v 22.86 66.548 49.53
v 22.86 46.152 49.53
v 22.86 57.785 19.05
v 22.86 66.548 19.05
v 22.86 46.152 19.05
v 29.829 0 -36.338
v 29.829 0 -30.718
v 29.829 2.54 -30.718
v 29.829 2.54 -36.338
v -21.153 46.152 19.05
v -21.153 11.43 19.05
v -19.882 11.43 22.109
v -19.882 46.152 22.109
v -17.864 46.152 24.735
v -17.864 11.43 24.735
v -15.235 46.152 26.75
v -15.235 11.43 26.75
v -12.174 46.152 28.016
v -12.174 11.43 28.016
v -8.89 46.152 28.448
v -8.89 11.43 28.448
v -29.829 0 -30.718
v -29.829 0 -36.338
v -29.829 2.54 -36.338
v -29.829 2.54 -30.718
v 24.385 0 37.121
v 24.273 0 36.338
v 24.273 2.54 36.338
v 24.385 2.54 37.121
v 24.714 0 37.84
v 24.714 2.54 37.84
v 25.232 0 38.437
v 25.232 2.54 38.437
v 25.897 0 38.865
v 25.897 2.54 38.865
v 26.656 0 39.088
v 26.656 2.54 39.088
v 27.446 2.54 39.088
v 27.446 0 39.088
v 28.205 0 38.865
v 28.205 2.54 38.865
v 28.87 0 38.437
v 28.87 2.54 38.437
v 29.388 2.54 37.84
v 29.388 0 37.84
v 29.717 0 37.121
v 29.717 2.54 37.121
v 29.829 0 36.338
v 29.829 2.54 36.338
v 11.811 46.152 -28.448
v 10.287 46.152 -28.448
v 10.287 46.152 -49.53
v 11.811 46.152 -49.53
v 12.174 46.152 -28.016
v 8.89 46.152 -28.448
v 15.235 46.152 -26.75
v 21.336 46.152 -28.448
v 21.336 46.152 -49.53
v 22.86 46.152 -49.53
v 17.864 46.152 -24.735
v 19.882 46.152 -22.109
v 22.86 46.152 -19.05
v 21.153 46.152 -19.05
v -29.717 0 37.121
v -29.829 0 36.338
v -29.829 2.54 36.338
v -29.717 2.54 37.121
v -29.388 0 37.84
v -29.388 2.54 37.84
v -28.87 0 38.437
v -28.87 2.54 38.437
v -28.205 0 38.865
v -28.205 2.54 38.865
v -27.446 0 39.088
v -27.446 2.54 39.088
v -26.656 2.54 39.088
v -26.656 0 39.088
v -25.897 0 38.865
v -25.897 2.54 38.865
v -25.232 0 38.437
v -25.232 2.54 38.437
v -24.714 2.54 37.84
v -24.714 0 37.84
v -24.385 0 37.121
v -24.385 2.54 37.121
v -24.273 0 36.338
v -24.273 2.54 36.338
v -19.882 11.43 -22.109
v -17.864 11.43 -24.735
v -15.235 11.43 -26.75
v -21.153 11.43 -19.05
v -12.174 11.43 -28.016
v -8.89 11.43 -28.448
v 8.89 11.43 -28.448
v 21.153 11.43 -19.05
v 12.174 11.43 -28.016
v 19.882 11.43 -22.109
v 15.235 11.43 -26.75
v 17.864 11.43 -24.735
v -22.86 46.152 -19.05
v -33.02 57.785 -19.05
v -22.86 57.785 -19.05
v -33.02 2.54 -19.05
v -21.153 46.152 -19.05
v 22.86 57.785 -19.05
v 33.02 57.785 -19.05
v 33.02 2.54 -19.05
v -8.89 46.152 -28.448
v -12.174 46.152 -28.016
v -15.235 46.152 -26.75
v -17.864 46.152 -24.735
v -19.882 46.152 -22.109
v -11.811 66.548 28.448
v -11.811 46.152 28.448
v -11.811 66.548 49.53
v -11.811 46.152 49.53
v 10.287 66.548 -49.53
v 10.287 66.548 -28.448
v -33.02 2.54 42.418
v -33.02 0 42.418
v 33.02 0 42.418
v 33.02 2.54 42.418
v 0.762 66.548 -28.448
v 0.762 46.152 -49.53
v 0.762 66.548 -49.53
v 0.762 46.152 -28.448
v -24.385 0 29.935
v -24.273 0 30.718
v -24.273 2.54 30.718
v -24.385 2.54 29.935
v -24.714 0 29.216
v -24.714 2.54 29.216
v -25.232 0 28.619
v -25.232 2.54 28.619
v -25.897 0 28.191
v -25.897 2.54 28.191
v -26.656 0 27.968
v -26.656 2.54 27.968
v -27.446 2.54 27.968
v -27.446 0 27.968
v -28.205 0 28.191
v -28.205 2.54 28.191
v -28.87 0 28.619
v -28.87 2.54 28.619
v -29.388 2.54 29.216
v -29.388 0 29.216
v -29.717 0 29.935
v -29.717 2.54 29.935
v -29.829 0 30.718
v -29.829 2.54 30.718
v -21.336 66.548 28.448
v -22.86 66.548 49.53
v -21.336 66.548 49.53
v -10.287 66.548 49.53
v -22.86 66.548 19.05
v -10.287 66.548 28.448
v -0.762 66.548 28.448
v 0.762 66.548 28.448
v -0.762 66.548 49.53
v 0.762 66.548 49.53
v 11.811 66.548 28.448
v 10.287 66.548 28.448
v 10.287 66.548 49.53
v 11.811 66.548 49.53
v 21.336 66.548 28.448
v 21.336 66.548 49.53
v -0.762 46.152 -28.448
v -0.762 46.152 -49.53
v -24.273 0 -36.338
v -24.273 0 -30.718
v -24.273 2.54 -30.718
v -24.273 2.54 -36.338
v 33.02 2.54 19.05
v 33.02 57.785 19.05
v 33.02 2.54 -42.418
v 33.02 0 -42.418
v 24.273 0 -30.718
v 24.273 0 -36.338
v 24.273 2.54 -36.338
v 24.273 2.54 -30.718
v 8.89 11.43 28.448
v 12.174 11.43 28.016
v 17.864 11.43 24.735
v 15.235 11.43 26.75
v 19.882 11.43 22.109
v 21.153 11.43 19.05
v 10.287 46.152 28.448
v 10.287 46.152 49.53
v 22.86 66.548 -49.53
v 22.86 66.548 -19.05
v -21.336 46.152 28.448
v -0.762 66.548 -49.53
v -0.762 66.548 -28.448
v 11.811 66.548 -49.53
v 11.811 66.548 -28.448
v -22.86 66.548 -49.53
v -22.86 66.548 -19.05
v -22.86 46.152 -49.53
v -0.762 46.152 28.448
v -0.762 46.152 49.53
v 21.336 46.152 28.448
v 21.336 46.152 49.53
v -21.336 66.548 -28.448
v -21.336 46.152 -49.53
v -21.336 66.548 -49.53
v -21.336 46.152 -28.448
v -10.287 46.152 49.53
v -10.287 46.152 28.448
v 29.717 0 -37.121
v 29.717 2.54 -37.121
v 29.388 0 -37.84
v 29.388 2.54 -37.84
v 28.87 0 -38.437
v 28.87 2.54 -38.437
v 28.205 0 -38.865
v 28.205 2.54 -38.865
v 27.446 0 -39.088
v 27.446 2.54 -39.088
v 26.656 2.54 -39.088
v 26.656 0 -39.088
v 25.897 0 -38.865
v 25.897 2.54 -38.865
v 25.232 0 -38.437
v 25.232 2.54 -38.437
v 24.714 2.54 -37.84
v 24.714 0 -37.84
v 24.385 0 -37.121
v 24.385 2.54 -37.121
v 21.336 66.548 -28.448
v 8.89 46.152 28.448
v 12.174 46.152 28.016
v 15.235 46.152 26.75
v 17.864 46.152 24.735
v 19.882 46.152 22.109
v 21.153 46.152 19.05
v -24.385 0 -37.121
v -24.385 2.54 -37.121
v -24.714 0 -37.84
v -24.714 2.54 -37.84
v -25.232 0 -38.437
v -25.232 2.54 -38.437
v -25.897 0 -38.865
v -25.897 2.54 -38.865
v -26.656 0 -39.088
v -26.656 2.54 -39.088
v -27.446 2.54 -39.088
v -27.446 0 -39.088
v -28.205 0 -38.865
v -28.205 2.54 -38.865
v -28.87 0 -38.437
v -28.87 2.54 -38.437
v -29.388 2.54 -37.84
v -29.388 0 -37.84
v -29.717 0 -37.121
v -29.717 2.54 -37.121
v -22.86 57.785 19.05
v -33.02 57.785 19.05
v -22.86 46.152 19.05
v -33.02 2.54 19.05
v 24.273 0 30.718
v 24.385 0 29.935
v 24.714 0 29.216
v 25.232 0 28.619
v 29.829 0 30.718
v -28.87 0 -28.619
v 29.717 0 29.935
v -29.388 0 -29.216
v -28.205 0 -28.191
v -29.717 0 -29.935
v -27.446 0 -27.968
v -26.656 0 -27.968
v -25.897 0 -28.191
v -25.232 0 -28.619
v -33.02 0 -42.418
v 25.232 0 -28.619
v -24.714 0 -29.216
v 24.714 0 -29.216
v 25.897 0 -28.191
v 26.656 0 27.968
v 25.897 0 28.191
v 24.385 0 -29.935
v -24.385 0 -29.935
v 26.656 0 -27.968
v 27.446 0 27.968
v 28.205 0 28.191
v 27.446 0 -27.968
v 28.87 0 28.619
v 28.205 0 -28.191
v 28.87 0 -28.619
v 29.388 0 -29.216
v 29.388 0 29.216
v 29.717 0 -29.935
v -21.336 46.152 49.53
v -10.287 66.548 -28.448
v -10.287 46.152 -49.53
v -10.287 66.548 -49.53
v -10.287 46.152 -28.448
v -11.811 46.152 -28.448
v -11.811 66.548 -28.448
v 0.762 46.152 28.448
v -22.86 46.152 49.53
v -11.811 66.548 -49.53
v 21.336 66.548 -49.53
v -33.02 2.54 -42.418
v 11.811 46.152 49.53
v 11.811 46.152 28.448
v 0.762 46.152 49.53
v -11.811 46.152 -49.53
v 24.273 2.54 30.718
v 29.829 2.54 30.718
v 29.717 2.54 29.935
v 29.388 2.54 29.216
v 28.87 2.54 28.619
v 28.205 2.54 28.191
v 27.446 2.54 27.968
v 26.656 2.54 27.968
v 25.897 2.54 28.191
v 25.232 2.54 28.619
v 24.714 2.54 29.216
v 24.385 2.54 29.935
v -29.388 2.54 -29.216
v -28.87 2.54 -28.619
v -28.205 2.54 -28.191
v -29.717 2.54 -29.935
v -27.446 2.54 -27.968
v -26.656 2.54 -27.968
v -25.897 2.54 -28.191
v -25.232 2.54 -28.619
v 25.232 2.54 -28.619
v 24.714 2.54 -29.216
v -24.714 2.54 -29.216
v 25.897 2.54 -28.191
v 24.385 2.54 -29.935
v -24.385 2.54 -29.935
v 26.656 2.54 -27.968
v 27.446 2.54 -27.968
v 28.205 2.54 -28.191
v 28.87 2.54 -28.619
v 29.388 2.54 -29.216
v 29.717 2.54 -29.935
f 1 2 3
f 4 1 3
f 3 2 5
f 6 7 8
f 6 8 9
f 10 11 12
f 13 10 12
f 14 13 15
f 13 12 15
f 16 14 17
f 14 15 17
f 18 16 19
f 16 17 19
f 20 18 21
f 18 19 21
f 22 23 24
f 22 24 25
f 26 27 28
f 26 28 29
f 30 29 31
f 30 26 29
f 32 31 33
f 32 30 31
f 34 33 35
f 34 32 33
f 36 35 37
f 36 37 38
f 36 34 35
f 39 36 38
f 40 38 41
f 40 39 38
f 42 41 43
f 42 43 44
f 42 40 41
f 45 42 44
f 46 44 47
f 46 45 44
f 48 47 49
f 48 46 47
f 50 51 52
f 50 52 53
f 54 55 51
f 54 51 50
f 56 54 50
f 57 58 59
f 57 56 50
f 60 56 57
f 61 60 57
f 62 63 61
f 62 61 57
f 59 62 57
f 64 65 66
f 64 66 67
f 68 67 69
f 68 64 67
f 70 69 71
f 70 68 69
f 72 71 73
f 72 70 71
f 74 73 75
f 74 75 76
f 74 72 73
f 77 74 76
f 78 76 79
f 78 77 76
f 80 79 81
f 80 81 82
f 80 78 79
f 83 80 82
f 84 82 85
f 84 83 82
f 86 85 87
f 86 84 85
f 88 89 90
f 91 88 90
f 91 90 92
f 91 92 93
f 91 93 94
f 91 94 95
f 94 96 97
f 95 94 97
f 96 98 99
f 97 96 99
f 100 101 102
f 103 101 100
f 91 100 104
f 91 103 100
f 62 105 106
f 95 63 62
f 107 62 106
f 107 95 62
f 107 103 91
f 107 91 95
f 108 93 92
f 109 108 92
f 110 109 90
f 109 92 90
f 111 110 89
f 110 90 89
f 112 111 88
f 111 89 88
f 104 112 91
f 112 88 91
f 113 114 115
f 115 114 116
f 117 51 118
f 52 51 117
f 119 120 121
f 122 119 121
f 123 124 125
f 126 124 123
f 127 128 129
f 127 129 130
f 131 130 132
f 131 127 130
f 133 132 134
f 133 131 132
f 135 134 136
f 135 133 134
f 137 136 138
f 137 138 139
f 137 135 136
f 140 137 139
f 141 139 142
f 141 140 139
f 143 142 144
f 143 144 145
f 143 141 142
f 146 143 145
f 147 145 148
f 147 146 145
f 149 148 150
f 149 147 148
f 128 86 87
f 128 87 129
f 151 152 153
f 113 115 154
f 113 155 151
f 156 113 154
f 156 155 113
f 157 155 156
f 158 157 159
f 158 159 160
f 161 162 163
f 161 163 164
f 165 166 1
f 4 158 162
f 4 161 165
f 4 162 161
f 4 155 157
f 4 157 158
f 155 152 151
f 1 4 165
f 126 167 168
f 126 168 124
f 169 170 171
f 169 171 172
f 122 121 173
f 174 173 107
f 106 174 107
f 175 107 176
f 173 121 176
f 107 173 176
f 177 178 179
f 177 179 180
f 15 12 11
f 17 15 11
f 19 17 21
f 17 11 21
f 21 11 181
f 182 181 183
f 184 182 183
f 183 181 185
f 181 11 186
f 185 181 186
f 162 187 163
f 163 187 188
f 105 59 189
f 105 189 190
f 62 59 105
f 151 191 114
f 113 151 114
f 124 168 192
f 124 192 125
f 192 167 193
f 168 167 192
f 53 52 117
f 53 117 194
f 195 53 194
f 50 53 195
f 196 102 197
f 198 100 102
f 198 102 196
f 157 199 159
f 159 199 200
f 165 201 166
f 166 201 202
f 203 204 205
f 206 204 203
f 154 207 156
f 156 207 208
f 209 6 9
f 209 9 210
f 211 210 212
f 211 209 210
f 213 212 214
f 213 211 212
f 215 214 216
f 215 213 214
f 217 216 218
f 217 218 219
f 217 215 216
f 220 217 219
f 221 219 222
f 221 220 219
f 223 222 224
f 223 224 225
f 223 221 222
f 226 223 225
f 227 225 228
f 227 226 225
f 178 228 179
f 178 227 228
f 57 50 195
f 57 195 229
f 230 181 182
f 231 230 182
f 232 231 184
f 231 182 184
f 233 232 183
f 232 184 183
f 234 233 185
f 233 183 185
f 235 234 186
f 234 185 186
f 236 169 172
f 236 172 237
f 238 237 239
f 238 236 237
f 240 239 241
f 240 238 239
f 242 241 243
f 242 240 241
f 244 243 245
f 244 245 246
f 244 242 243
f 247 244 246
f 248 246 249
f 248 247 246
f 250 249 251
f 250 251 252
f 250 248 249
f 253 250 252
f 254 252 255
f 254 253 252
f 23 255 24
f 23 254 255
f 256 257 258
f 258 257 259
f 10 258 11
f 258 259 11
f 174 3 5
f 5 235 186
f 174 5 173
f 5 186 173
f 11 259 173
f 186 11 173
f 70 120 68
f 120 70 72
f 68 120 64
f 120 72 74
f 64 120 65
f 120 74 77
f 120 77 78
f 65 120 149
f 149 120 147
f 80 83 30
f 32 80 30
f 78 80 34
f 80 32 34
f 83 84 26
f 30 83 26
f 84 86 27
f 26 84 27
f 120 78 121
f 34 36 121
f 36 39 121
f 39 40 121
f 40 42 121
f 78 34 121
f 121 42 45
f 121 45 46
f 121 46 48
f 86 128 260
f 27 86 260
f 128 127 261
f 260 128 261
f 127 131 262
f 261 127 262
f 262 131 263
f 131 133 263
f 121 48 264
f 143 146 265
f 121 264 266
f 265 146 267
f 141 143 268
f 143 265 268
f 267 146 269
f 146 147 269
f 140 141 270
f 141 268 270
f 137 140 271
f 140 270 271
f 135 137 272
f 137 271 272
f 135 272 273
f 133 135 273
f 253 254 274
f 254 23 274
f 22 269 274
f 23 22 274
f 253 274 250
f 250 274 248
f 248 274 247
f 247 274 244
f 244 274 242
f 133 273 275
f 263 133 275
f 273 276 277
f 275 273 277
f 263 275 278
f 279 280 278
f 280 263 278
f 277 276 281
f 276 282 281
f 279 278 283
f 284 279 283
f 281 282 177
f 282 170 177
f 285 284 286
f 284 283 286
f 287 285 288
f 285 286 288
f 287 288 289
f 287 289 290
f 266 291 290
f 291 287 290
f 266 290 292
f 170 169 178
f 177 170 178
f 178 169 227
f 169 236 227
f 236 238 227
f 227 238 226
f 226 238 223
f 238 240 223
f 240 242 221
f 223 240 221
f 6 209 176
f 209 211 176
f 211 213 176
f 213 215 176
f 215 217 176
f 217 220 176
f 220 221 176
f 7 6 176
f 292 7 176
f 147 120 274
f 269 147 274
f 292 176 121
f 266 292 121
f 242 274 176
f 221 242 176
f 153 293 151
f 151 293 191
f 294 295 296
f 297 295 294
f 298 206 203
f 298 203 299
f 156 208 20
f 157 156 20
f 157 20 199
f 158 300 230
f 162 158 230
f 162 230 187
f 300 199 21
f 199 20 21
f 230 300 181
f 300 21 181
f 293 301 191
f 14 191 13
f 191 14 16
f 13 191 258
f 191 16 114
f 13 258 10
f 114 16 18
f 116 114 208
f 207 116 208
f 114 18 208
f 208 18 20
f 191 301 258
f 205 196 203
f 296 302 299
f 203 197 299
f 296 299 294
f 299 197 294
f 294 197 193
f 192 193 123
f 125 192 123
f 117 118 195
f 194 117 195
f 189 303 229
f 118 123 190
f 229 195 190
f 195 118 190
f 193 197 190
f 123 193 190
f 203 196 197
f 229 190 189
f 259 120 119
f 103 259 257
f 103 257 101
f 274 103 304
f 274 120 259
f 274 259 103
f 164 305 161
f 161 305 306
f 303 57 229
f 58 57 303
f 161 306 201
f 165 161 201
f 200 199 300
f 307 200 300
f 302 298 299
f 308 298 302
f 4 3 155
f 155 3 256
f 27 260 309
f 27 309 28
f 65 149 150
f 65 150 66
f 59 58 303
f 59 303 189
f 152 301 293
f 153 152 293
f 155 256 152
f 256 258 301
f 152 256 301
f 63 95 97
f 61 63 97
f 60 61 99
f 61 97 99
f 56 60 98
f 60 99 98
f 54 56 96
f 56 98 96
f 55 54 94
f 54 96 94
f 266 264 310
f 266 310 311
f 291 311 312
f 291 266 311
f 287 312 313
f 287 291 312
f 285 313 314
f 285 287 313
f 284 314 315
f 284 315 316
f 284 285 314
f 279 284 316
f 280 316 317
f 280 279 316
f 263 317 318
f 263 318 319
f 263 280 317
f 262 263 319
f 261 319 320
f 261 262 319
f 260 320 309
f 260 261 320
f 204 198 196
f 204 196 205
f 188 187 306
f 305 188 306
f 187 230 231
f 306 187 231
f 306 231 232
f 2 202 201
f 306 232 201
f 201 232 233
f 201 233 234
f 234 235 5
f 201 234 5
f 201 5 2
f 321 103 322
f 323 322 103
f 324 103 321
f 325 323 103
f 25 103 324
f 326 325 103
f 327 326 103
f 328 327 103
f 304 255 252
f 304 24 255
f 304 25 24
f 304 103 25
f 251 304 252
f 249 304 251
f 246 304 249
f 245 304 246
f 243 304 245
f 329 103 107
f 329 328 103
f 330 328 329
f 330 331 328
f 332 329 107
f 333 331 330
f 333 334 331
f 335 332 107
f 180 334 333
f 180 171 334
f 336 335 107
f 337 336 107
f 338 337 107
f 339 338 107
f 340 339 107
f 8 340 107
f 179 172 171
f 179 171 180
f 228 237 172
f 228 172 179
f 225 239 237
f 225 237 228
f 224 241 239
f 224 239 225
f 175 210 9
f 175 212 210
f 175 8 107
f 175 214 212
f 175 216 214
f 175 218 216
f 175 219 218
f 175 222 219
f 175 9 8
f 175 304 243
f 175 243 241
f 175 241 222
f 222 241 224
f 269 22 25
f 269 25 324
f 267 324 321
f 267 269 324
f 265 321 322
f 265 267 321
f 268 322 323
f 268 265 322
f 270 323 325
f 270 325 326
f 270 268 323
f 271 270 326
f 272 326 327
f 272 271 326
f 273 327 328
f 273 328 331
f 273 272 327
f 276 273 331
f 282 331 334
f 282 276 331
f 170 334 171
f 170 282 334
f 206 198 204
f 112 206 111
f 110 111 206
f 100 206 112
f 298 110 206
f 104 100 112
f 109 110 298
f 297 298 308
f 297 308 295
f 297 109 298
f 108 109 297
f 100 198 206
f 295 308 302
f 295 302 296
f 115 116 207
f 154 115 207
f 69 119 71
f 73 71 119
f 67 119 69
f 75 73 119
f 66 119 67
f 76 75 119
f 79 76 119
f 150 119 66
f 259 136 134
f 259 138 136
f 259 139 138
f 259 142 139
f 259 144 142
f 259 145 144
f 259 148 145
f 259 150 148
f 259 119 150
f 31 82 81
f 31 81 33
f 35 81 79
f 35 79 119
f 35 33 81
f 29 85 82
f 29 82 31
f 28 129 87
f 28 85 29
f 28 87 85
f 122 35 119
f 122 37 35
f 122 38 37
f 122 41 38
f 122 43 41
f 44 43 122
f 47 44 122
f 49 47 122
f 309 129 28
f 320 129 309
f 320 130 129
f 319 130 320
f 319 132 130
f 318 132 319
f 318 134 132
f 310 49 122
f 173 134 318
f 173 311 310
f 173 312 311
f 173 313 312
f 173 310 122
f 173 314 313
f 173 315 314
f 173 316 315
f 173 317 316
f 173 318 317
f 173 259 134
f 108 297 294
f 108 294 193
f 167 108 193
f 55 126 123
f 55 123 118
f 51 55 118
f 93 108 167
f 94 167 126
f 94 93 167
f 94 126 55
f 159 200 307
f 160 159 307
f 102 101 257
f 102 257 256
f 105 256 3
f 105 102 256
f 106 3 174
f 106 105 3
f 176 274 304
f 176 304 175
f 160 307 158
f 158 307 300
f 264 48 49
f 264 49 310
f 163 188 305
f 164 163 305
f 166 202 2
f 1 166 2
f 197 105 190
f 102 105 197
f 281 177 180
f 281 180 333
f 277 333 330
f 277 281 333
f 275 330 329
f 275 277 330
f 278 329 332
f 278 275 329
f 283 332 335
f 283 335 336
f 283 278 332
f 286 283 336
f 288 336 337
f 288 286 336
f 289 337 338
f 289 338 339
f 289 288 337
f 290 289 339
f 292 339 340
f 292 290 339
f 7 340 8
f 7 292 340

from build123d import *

# Parameters (mm, degrees)
SKETCH1_W                           = 66.04
SKETCH1_H                           = 84.836
BOSS_EXTRUDE1_DEPTH                 = 2.54
F_7_32_0_21875_DIAMETER_SLOT1_DEPTH = 2.54
SKETCH4_W                           = 66.04
SKETCH4_H                           = 38.1
BOSS_EXTRUDE2_DEPTH                 = 55.245
BOSS_EXTRUDE3_DEPTH                 = 34.7218
BOSS_EXTRUDE4_DEPTH                 = 20.3962


# Read off the part's stored shape, not the designer's step: 7/32 (0.21875) Diameter Slot1
with BuildPart() as part:
    # Sketch1 → Boss-Extrude1 (new body)
    with BuildSketch(Plane(origin=(0, 0, 0), x_dir=(1, 0, 0), z_dir=(0, 1, 0))):
        Rectangle(SKETCH1_W, SKETCH1_H)
    extrude(amount=BOSS_EXTRUDE1_DEPTH)

    # 7/32 (0.21875) Diameter Slot1 outline → 7/32 (0.21875) Diameter Slot1 (cut)
    with BuildSketch(Plane(origin=(0, 0, 0), x_dir=(1, 0, 0), z_dir=(0, 1, 0))):
        with BuildLine():
            Line((-24.272875, -36.337875), (-24.272875, -30.718125))
            ThreePointArc((-24.272875, -30.718125), (-27.051, -27.94), (-29.829125, -30.718125))
            Line((-29.829125, -30.718125), (-29.829125, -36.337875))
            ThreePointArc((-29.829125, -36.337875), (-27.051, -39.116), (-24.272875, -36.337875))
        make_face()
        with BuildLine():
            ThreePointArc((-24.272875, 36.337875), (-27.051, 39.116), (-29.829125, 36.337875))
            Line((-29.829125, 36.337875), (-29.829125, 30.718125))
            ThreePointArc((-29.829125, 30.718125), (-27.051, 27.94), (-24.272875, 30.718125))
            Line((-24.272875, 30.718125), (-24.272875, 36.337875))
        make_face()
        with BuildLine():
            Line((29.829125, -36.337875), (29.829125, -30.718125))
            ThreePointArc((29.829125, -30.718125), (27.051, -27.94), (24.272875, -30.718125))
            Line((24.272875, -30.718125), (24.272875, -36.337875))
            ThreePointArc((24.272875, -36.337875), (27.051, -39.116), (29.829125, -36.337875))
        make_face()
        with BuildLine():
            ThreePointArc((29.829125, 36.337875), (27.051, 39.116), (24.272875, 36.337875))
            Line((24.272875, 36.337875), (24.272875, 30.718125))
            ThreePointArc((24.272875, 30.718125), (27.051, 27.94), (29.829125, 30.718125))
            Line((29.829125, 30.718125), (29.829125, 36.337875))
        make_face()
    extrude(amount=F_7_32_0_21875_DIAMETER_SLOT1_DEPTH, mode=Mode.SUBTRACT)

    # Sketch4 → Boss-Extrude2 (add)
    with BuildSketch(Plane(origin=(0, 2.54, 0), x_dir=(1, 0, 0), z_dir=(0, 1, 0))):
        Rectangle(SKETCH4_W, SKETCH4_H)
    extrude(amount=BOSS_EXTRUDE2_DEPTH)

    # Sketch5 → Boss-Extrude3 (add)
    with BuildSketch(Plane(origin=(0, 11.43, 0), x_dir=(1, 0, 0), z_dir=(0, 1, 0))):
        with BuildLine():
            Line((-21.59, 15.748), (-21.59, -15.748))
            ThreePointArc((-21.59, -15.748), (-17.870256121, -24.728256121), (-8.89, -28.448))
            Line((-8.89, -28.448), (8.89, -28.448))
            ThreePointArc((8.89, -28.448), (17.870256121, -24.728256121), (21.59, -15.748))
            Line((21.59, -15.748), (21.59, 15.748))
            ThreePointArc((21.59, 15.748), (17.870256121, 24.728256121), (8.89, 28.448))
            Line((8.89, 28.448), (-8.89, 28.448))
            ThreePointArc((-8.89, 28.448), (-17.870256121, 24.728256121), (-21.59, 15.748))
        make_face()
    extrude(amount=BOSS_EXTRUDE3_DEPTH)

    # Sketch6 → Boss-Extrude4 (add)
    with BuildSketch(Plane(origin=(0, 46.1518, 0), x_dir=(1, 0, 0), z_dir=(0, 1, 0))):
        Polygon((22.86, -19.05), (-22.86, -19.05), (-22.86, -49.53), (-21.336, -49.53), (-21.336, -28.448), (-11.811, -28.448), (-11.811, -49.53), (-10.287, -49.53), (-10.287, -28.448), (-0.762, -28.448), (-0.762, -49.53), (0.762, -49.53), (0.762, -28.448), (10.287, -28.448), (10.287, -49.53), (11.811, -49.53), (11.811, -28.448), (21.336, -28.448), (21.336, -49.53), (22.86, -49.53), align=None)
    boss_extrude4 = extrude(amount=BOSS_EXTRUDE4_DEPTH)

    # Mirror1: Boss-Extrude4 across plane
    add(boss_extrude4.mirror(Plane.XY))


solid = part.part
